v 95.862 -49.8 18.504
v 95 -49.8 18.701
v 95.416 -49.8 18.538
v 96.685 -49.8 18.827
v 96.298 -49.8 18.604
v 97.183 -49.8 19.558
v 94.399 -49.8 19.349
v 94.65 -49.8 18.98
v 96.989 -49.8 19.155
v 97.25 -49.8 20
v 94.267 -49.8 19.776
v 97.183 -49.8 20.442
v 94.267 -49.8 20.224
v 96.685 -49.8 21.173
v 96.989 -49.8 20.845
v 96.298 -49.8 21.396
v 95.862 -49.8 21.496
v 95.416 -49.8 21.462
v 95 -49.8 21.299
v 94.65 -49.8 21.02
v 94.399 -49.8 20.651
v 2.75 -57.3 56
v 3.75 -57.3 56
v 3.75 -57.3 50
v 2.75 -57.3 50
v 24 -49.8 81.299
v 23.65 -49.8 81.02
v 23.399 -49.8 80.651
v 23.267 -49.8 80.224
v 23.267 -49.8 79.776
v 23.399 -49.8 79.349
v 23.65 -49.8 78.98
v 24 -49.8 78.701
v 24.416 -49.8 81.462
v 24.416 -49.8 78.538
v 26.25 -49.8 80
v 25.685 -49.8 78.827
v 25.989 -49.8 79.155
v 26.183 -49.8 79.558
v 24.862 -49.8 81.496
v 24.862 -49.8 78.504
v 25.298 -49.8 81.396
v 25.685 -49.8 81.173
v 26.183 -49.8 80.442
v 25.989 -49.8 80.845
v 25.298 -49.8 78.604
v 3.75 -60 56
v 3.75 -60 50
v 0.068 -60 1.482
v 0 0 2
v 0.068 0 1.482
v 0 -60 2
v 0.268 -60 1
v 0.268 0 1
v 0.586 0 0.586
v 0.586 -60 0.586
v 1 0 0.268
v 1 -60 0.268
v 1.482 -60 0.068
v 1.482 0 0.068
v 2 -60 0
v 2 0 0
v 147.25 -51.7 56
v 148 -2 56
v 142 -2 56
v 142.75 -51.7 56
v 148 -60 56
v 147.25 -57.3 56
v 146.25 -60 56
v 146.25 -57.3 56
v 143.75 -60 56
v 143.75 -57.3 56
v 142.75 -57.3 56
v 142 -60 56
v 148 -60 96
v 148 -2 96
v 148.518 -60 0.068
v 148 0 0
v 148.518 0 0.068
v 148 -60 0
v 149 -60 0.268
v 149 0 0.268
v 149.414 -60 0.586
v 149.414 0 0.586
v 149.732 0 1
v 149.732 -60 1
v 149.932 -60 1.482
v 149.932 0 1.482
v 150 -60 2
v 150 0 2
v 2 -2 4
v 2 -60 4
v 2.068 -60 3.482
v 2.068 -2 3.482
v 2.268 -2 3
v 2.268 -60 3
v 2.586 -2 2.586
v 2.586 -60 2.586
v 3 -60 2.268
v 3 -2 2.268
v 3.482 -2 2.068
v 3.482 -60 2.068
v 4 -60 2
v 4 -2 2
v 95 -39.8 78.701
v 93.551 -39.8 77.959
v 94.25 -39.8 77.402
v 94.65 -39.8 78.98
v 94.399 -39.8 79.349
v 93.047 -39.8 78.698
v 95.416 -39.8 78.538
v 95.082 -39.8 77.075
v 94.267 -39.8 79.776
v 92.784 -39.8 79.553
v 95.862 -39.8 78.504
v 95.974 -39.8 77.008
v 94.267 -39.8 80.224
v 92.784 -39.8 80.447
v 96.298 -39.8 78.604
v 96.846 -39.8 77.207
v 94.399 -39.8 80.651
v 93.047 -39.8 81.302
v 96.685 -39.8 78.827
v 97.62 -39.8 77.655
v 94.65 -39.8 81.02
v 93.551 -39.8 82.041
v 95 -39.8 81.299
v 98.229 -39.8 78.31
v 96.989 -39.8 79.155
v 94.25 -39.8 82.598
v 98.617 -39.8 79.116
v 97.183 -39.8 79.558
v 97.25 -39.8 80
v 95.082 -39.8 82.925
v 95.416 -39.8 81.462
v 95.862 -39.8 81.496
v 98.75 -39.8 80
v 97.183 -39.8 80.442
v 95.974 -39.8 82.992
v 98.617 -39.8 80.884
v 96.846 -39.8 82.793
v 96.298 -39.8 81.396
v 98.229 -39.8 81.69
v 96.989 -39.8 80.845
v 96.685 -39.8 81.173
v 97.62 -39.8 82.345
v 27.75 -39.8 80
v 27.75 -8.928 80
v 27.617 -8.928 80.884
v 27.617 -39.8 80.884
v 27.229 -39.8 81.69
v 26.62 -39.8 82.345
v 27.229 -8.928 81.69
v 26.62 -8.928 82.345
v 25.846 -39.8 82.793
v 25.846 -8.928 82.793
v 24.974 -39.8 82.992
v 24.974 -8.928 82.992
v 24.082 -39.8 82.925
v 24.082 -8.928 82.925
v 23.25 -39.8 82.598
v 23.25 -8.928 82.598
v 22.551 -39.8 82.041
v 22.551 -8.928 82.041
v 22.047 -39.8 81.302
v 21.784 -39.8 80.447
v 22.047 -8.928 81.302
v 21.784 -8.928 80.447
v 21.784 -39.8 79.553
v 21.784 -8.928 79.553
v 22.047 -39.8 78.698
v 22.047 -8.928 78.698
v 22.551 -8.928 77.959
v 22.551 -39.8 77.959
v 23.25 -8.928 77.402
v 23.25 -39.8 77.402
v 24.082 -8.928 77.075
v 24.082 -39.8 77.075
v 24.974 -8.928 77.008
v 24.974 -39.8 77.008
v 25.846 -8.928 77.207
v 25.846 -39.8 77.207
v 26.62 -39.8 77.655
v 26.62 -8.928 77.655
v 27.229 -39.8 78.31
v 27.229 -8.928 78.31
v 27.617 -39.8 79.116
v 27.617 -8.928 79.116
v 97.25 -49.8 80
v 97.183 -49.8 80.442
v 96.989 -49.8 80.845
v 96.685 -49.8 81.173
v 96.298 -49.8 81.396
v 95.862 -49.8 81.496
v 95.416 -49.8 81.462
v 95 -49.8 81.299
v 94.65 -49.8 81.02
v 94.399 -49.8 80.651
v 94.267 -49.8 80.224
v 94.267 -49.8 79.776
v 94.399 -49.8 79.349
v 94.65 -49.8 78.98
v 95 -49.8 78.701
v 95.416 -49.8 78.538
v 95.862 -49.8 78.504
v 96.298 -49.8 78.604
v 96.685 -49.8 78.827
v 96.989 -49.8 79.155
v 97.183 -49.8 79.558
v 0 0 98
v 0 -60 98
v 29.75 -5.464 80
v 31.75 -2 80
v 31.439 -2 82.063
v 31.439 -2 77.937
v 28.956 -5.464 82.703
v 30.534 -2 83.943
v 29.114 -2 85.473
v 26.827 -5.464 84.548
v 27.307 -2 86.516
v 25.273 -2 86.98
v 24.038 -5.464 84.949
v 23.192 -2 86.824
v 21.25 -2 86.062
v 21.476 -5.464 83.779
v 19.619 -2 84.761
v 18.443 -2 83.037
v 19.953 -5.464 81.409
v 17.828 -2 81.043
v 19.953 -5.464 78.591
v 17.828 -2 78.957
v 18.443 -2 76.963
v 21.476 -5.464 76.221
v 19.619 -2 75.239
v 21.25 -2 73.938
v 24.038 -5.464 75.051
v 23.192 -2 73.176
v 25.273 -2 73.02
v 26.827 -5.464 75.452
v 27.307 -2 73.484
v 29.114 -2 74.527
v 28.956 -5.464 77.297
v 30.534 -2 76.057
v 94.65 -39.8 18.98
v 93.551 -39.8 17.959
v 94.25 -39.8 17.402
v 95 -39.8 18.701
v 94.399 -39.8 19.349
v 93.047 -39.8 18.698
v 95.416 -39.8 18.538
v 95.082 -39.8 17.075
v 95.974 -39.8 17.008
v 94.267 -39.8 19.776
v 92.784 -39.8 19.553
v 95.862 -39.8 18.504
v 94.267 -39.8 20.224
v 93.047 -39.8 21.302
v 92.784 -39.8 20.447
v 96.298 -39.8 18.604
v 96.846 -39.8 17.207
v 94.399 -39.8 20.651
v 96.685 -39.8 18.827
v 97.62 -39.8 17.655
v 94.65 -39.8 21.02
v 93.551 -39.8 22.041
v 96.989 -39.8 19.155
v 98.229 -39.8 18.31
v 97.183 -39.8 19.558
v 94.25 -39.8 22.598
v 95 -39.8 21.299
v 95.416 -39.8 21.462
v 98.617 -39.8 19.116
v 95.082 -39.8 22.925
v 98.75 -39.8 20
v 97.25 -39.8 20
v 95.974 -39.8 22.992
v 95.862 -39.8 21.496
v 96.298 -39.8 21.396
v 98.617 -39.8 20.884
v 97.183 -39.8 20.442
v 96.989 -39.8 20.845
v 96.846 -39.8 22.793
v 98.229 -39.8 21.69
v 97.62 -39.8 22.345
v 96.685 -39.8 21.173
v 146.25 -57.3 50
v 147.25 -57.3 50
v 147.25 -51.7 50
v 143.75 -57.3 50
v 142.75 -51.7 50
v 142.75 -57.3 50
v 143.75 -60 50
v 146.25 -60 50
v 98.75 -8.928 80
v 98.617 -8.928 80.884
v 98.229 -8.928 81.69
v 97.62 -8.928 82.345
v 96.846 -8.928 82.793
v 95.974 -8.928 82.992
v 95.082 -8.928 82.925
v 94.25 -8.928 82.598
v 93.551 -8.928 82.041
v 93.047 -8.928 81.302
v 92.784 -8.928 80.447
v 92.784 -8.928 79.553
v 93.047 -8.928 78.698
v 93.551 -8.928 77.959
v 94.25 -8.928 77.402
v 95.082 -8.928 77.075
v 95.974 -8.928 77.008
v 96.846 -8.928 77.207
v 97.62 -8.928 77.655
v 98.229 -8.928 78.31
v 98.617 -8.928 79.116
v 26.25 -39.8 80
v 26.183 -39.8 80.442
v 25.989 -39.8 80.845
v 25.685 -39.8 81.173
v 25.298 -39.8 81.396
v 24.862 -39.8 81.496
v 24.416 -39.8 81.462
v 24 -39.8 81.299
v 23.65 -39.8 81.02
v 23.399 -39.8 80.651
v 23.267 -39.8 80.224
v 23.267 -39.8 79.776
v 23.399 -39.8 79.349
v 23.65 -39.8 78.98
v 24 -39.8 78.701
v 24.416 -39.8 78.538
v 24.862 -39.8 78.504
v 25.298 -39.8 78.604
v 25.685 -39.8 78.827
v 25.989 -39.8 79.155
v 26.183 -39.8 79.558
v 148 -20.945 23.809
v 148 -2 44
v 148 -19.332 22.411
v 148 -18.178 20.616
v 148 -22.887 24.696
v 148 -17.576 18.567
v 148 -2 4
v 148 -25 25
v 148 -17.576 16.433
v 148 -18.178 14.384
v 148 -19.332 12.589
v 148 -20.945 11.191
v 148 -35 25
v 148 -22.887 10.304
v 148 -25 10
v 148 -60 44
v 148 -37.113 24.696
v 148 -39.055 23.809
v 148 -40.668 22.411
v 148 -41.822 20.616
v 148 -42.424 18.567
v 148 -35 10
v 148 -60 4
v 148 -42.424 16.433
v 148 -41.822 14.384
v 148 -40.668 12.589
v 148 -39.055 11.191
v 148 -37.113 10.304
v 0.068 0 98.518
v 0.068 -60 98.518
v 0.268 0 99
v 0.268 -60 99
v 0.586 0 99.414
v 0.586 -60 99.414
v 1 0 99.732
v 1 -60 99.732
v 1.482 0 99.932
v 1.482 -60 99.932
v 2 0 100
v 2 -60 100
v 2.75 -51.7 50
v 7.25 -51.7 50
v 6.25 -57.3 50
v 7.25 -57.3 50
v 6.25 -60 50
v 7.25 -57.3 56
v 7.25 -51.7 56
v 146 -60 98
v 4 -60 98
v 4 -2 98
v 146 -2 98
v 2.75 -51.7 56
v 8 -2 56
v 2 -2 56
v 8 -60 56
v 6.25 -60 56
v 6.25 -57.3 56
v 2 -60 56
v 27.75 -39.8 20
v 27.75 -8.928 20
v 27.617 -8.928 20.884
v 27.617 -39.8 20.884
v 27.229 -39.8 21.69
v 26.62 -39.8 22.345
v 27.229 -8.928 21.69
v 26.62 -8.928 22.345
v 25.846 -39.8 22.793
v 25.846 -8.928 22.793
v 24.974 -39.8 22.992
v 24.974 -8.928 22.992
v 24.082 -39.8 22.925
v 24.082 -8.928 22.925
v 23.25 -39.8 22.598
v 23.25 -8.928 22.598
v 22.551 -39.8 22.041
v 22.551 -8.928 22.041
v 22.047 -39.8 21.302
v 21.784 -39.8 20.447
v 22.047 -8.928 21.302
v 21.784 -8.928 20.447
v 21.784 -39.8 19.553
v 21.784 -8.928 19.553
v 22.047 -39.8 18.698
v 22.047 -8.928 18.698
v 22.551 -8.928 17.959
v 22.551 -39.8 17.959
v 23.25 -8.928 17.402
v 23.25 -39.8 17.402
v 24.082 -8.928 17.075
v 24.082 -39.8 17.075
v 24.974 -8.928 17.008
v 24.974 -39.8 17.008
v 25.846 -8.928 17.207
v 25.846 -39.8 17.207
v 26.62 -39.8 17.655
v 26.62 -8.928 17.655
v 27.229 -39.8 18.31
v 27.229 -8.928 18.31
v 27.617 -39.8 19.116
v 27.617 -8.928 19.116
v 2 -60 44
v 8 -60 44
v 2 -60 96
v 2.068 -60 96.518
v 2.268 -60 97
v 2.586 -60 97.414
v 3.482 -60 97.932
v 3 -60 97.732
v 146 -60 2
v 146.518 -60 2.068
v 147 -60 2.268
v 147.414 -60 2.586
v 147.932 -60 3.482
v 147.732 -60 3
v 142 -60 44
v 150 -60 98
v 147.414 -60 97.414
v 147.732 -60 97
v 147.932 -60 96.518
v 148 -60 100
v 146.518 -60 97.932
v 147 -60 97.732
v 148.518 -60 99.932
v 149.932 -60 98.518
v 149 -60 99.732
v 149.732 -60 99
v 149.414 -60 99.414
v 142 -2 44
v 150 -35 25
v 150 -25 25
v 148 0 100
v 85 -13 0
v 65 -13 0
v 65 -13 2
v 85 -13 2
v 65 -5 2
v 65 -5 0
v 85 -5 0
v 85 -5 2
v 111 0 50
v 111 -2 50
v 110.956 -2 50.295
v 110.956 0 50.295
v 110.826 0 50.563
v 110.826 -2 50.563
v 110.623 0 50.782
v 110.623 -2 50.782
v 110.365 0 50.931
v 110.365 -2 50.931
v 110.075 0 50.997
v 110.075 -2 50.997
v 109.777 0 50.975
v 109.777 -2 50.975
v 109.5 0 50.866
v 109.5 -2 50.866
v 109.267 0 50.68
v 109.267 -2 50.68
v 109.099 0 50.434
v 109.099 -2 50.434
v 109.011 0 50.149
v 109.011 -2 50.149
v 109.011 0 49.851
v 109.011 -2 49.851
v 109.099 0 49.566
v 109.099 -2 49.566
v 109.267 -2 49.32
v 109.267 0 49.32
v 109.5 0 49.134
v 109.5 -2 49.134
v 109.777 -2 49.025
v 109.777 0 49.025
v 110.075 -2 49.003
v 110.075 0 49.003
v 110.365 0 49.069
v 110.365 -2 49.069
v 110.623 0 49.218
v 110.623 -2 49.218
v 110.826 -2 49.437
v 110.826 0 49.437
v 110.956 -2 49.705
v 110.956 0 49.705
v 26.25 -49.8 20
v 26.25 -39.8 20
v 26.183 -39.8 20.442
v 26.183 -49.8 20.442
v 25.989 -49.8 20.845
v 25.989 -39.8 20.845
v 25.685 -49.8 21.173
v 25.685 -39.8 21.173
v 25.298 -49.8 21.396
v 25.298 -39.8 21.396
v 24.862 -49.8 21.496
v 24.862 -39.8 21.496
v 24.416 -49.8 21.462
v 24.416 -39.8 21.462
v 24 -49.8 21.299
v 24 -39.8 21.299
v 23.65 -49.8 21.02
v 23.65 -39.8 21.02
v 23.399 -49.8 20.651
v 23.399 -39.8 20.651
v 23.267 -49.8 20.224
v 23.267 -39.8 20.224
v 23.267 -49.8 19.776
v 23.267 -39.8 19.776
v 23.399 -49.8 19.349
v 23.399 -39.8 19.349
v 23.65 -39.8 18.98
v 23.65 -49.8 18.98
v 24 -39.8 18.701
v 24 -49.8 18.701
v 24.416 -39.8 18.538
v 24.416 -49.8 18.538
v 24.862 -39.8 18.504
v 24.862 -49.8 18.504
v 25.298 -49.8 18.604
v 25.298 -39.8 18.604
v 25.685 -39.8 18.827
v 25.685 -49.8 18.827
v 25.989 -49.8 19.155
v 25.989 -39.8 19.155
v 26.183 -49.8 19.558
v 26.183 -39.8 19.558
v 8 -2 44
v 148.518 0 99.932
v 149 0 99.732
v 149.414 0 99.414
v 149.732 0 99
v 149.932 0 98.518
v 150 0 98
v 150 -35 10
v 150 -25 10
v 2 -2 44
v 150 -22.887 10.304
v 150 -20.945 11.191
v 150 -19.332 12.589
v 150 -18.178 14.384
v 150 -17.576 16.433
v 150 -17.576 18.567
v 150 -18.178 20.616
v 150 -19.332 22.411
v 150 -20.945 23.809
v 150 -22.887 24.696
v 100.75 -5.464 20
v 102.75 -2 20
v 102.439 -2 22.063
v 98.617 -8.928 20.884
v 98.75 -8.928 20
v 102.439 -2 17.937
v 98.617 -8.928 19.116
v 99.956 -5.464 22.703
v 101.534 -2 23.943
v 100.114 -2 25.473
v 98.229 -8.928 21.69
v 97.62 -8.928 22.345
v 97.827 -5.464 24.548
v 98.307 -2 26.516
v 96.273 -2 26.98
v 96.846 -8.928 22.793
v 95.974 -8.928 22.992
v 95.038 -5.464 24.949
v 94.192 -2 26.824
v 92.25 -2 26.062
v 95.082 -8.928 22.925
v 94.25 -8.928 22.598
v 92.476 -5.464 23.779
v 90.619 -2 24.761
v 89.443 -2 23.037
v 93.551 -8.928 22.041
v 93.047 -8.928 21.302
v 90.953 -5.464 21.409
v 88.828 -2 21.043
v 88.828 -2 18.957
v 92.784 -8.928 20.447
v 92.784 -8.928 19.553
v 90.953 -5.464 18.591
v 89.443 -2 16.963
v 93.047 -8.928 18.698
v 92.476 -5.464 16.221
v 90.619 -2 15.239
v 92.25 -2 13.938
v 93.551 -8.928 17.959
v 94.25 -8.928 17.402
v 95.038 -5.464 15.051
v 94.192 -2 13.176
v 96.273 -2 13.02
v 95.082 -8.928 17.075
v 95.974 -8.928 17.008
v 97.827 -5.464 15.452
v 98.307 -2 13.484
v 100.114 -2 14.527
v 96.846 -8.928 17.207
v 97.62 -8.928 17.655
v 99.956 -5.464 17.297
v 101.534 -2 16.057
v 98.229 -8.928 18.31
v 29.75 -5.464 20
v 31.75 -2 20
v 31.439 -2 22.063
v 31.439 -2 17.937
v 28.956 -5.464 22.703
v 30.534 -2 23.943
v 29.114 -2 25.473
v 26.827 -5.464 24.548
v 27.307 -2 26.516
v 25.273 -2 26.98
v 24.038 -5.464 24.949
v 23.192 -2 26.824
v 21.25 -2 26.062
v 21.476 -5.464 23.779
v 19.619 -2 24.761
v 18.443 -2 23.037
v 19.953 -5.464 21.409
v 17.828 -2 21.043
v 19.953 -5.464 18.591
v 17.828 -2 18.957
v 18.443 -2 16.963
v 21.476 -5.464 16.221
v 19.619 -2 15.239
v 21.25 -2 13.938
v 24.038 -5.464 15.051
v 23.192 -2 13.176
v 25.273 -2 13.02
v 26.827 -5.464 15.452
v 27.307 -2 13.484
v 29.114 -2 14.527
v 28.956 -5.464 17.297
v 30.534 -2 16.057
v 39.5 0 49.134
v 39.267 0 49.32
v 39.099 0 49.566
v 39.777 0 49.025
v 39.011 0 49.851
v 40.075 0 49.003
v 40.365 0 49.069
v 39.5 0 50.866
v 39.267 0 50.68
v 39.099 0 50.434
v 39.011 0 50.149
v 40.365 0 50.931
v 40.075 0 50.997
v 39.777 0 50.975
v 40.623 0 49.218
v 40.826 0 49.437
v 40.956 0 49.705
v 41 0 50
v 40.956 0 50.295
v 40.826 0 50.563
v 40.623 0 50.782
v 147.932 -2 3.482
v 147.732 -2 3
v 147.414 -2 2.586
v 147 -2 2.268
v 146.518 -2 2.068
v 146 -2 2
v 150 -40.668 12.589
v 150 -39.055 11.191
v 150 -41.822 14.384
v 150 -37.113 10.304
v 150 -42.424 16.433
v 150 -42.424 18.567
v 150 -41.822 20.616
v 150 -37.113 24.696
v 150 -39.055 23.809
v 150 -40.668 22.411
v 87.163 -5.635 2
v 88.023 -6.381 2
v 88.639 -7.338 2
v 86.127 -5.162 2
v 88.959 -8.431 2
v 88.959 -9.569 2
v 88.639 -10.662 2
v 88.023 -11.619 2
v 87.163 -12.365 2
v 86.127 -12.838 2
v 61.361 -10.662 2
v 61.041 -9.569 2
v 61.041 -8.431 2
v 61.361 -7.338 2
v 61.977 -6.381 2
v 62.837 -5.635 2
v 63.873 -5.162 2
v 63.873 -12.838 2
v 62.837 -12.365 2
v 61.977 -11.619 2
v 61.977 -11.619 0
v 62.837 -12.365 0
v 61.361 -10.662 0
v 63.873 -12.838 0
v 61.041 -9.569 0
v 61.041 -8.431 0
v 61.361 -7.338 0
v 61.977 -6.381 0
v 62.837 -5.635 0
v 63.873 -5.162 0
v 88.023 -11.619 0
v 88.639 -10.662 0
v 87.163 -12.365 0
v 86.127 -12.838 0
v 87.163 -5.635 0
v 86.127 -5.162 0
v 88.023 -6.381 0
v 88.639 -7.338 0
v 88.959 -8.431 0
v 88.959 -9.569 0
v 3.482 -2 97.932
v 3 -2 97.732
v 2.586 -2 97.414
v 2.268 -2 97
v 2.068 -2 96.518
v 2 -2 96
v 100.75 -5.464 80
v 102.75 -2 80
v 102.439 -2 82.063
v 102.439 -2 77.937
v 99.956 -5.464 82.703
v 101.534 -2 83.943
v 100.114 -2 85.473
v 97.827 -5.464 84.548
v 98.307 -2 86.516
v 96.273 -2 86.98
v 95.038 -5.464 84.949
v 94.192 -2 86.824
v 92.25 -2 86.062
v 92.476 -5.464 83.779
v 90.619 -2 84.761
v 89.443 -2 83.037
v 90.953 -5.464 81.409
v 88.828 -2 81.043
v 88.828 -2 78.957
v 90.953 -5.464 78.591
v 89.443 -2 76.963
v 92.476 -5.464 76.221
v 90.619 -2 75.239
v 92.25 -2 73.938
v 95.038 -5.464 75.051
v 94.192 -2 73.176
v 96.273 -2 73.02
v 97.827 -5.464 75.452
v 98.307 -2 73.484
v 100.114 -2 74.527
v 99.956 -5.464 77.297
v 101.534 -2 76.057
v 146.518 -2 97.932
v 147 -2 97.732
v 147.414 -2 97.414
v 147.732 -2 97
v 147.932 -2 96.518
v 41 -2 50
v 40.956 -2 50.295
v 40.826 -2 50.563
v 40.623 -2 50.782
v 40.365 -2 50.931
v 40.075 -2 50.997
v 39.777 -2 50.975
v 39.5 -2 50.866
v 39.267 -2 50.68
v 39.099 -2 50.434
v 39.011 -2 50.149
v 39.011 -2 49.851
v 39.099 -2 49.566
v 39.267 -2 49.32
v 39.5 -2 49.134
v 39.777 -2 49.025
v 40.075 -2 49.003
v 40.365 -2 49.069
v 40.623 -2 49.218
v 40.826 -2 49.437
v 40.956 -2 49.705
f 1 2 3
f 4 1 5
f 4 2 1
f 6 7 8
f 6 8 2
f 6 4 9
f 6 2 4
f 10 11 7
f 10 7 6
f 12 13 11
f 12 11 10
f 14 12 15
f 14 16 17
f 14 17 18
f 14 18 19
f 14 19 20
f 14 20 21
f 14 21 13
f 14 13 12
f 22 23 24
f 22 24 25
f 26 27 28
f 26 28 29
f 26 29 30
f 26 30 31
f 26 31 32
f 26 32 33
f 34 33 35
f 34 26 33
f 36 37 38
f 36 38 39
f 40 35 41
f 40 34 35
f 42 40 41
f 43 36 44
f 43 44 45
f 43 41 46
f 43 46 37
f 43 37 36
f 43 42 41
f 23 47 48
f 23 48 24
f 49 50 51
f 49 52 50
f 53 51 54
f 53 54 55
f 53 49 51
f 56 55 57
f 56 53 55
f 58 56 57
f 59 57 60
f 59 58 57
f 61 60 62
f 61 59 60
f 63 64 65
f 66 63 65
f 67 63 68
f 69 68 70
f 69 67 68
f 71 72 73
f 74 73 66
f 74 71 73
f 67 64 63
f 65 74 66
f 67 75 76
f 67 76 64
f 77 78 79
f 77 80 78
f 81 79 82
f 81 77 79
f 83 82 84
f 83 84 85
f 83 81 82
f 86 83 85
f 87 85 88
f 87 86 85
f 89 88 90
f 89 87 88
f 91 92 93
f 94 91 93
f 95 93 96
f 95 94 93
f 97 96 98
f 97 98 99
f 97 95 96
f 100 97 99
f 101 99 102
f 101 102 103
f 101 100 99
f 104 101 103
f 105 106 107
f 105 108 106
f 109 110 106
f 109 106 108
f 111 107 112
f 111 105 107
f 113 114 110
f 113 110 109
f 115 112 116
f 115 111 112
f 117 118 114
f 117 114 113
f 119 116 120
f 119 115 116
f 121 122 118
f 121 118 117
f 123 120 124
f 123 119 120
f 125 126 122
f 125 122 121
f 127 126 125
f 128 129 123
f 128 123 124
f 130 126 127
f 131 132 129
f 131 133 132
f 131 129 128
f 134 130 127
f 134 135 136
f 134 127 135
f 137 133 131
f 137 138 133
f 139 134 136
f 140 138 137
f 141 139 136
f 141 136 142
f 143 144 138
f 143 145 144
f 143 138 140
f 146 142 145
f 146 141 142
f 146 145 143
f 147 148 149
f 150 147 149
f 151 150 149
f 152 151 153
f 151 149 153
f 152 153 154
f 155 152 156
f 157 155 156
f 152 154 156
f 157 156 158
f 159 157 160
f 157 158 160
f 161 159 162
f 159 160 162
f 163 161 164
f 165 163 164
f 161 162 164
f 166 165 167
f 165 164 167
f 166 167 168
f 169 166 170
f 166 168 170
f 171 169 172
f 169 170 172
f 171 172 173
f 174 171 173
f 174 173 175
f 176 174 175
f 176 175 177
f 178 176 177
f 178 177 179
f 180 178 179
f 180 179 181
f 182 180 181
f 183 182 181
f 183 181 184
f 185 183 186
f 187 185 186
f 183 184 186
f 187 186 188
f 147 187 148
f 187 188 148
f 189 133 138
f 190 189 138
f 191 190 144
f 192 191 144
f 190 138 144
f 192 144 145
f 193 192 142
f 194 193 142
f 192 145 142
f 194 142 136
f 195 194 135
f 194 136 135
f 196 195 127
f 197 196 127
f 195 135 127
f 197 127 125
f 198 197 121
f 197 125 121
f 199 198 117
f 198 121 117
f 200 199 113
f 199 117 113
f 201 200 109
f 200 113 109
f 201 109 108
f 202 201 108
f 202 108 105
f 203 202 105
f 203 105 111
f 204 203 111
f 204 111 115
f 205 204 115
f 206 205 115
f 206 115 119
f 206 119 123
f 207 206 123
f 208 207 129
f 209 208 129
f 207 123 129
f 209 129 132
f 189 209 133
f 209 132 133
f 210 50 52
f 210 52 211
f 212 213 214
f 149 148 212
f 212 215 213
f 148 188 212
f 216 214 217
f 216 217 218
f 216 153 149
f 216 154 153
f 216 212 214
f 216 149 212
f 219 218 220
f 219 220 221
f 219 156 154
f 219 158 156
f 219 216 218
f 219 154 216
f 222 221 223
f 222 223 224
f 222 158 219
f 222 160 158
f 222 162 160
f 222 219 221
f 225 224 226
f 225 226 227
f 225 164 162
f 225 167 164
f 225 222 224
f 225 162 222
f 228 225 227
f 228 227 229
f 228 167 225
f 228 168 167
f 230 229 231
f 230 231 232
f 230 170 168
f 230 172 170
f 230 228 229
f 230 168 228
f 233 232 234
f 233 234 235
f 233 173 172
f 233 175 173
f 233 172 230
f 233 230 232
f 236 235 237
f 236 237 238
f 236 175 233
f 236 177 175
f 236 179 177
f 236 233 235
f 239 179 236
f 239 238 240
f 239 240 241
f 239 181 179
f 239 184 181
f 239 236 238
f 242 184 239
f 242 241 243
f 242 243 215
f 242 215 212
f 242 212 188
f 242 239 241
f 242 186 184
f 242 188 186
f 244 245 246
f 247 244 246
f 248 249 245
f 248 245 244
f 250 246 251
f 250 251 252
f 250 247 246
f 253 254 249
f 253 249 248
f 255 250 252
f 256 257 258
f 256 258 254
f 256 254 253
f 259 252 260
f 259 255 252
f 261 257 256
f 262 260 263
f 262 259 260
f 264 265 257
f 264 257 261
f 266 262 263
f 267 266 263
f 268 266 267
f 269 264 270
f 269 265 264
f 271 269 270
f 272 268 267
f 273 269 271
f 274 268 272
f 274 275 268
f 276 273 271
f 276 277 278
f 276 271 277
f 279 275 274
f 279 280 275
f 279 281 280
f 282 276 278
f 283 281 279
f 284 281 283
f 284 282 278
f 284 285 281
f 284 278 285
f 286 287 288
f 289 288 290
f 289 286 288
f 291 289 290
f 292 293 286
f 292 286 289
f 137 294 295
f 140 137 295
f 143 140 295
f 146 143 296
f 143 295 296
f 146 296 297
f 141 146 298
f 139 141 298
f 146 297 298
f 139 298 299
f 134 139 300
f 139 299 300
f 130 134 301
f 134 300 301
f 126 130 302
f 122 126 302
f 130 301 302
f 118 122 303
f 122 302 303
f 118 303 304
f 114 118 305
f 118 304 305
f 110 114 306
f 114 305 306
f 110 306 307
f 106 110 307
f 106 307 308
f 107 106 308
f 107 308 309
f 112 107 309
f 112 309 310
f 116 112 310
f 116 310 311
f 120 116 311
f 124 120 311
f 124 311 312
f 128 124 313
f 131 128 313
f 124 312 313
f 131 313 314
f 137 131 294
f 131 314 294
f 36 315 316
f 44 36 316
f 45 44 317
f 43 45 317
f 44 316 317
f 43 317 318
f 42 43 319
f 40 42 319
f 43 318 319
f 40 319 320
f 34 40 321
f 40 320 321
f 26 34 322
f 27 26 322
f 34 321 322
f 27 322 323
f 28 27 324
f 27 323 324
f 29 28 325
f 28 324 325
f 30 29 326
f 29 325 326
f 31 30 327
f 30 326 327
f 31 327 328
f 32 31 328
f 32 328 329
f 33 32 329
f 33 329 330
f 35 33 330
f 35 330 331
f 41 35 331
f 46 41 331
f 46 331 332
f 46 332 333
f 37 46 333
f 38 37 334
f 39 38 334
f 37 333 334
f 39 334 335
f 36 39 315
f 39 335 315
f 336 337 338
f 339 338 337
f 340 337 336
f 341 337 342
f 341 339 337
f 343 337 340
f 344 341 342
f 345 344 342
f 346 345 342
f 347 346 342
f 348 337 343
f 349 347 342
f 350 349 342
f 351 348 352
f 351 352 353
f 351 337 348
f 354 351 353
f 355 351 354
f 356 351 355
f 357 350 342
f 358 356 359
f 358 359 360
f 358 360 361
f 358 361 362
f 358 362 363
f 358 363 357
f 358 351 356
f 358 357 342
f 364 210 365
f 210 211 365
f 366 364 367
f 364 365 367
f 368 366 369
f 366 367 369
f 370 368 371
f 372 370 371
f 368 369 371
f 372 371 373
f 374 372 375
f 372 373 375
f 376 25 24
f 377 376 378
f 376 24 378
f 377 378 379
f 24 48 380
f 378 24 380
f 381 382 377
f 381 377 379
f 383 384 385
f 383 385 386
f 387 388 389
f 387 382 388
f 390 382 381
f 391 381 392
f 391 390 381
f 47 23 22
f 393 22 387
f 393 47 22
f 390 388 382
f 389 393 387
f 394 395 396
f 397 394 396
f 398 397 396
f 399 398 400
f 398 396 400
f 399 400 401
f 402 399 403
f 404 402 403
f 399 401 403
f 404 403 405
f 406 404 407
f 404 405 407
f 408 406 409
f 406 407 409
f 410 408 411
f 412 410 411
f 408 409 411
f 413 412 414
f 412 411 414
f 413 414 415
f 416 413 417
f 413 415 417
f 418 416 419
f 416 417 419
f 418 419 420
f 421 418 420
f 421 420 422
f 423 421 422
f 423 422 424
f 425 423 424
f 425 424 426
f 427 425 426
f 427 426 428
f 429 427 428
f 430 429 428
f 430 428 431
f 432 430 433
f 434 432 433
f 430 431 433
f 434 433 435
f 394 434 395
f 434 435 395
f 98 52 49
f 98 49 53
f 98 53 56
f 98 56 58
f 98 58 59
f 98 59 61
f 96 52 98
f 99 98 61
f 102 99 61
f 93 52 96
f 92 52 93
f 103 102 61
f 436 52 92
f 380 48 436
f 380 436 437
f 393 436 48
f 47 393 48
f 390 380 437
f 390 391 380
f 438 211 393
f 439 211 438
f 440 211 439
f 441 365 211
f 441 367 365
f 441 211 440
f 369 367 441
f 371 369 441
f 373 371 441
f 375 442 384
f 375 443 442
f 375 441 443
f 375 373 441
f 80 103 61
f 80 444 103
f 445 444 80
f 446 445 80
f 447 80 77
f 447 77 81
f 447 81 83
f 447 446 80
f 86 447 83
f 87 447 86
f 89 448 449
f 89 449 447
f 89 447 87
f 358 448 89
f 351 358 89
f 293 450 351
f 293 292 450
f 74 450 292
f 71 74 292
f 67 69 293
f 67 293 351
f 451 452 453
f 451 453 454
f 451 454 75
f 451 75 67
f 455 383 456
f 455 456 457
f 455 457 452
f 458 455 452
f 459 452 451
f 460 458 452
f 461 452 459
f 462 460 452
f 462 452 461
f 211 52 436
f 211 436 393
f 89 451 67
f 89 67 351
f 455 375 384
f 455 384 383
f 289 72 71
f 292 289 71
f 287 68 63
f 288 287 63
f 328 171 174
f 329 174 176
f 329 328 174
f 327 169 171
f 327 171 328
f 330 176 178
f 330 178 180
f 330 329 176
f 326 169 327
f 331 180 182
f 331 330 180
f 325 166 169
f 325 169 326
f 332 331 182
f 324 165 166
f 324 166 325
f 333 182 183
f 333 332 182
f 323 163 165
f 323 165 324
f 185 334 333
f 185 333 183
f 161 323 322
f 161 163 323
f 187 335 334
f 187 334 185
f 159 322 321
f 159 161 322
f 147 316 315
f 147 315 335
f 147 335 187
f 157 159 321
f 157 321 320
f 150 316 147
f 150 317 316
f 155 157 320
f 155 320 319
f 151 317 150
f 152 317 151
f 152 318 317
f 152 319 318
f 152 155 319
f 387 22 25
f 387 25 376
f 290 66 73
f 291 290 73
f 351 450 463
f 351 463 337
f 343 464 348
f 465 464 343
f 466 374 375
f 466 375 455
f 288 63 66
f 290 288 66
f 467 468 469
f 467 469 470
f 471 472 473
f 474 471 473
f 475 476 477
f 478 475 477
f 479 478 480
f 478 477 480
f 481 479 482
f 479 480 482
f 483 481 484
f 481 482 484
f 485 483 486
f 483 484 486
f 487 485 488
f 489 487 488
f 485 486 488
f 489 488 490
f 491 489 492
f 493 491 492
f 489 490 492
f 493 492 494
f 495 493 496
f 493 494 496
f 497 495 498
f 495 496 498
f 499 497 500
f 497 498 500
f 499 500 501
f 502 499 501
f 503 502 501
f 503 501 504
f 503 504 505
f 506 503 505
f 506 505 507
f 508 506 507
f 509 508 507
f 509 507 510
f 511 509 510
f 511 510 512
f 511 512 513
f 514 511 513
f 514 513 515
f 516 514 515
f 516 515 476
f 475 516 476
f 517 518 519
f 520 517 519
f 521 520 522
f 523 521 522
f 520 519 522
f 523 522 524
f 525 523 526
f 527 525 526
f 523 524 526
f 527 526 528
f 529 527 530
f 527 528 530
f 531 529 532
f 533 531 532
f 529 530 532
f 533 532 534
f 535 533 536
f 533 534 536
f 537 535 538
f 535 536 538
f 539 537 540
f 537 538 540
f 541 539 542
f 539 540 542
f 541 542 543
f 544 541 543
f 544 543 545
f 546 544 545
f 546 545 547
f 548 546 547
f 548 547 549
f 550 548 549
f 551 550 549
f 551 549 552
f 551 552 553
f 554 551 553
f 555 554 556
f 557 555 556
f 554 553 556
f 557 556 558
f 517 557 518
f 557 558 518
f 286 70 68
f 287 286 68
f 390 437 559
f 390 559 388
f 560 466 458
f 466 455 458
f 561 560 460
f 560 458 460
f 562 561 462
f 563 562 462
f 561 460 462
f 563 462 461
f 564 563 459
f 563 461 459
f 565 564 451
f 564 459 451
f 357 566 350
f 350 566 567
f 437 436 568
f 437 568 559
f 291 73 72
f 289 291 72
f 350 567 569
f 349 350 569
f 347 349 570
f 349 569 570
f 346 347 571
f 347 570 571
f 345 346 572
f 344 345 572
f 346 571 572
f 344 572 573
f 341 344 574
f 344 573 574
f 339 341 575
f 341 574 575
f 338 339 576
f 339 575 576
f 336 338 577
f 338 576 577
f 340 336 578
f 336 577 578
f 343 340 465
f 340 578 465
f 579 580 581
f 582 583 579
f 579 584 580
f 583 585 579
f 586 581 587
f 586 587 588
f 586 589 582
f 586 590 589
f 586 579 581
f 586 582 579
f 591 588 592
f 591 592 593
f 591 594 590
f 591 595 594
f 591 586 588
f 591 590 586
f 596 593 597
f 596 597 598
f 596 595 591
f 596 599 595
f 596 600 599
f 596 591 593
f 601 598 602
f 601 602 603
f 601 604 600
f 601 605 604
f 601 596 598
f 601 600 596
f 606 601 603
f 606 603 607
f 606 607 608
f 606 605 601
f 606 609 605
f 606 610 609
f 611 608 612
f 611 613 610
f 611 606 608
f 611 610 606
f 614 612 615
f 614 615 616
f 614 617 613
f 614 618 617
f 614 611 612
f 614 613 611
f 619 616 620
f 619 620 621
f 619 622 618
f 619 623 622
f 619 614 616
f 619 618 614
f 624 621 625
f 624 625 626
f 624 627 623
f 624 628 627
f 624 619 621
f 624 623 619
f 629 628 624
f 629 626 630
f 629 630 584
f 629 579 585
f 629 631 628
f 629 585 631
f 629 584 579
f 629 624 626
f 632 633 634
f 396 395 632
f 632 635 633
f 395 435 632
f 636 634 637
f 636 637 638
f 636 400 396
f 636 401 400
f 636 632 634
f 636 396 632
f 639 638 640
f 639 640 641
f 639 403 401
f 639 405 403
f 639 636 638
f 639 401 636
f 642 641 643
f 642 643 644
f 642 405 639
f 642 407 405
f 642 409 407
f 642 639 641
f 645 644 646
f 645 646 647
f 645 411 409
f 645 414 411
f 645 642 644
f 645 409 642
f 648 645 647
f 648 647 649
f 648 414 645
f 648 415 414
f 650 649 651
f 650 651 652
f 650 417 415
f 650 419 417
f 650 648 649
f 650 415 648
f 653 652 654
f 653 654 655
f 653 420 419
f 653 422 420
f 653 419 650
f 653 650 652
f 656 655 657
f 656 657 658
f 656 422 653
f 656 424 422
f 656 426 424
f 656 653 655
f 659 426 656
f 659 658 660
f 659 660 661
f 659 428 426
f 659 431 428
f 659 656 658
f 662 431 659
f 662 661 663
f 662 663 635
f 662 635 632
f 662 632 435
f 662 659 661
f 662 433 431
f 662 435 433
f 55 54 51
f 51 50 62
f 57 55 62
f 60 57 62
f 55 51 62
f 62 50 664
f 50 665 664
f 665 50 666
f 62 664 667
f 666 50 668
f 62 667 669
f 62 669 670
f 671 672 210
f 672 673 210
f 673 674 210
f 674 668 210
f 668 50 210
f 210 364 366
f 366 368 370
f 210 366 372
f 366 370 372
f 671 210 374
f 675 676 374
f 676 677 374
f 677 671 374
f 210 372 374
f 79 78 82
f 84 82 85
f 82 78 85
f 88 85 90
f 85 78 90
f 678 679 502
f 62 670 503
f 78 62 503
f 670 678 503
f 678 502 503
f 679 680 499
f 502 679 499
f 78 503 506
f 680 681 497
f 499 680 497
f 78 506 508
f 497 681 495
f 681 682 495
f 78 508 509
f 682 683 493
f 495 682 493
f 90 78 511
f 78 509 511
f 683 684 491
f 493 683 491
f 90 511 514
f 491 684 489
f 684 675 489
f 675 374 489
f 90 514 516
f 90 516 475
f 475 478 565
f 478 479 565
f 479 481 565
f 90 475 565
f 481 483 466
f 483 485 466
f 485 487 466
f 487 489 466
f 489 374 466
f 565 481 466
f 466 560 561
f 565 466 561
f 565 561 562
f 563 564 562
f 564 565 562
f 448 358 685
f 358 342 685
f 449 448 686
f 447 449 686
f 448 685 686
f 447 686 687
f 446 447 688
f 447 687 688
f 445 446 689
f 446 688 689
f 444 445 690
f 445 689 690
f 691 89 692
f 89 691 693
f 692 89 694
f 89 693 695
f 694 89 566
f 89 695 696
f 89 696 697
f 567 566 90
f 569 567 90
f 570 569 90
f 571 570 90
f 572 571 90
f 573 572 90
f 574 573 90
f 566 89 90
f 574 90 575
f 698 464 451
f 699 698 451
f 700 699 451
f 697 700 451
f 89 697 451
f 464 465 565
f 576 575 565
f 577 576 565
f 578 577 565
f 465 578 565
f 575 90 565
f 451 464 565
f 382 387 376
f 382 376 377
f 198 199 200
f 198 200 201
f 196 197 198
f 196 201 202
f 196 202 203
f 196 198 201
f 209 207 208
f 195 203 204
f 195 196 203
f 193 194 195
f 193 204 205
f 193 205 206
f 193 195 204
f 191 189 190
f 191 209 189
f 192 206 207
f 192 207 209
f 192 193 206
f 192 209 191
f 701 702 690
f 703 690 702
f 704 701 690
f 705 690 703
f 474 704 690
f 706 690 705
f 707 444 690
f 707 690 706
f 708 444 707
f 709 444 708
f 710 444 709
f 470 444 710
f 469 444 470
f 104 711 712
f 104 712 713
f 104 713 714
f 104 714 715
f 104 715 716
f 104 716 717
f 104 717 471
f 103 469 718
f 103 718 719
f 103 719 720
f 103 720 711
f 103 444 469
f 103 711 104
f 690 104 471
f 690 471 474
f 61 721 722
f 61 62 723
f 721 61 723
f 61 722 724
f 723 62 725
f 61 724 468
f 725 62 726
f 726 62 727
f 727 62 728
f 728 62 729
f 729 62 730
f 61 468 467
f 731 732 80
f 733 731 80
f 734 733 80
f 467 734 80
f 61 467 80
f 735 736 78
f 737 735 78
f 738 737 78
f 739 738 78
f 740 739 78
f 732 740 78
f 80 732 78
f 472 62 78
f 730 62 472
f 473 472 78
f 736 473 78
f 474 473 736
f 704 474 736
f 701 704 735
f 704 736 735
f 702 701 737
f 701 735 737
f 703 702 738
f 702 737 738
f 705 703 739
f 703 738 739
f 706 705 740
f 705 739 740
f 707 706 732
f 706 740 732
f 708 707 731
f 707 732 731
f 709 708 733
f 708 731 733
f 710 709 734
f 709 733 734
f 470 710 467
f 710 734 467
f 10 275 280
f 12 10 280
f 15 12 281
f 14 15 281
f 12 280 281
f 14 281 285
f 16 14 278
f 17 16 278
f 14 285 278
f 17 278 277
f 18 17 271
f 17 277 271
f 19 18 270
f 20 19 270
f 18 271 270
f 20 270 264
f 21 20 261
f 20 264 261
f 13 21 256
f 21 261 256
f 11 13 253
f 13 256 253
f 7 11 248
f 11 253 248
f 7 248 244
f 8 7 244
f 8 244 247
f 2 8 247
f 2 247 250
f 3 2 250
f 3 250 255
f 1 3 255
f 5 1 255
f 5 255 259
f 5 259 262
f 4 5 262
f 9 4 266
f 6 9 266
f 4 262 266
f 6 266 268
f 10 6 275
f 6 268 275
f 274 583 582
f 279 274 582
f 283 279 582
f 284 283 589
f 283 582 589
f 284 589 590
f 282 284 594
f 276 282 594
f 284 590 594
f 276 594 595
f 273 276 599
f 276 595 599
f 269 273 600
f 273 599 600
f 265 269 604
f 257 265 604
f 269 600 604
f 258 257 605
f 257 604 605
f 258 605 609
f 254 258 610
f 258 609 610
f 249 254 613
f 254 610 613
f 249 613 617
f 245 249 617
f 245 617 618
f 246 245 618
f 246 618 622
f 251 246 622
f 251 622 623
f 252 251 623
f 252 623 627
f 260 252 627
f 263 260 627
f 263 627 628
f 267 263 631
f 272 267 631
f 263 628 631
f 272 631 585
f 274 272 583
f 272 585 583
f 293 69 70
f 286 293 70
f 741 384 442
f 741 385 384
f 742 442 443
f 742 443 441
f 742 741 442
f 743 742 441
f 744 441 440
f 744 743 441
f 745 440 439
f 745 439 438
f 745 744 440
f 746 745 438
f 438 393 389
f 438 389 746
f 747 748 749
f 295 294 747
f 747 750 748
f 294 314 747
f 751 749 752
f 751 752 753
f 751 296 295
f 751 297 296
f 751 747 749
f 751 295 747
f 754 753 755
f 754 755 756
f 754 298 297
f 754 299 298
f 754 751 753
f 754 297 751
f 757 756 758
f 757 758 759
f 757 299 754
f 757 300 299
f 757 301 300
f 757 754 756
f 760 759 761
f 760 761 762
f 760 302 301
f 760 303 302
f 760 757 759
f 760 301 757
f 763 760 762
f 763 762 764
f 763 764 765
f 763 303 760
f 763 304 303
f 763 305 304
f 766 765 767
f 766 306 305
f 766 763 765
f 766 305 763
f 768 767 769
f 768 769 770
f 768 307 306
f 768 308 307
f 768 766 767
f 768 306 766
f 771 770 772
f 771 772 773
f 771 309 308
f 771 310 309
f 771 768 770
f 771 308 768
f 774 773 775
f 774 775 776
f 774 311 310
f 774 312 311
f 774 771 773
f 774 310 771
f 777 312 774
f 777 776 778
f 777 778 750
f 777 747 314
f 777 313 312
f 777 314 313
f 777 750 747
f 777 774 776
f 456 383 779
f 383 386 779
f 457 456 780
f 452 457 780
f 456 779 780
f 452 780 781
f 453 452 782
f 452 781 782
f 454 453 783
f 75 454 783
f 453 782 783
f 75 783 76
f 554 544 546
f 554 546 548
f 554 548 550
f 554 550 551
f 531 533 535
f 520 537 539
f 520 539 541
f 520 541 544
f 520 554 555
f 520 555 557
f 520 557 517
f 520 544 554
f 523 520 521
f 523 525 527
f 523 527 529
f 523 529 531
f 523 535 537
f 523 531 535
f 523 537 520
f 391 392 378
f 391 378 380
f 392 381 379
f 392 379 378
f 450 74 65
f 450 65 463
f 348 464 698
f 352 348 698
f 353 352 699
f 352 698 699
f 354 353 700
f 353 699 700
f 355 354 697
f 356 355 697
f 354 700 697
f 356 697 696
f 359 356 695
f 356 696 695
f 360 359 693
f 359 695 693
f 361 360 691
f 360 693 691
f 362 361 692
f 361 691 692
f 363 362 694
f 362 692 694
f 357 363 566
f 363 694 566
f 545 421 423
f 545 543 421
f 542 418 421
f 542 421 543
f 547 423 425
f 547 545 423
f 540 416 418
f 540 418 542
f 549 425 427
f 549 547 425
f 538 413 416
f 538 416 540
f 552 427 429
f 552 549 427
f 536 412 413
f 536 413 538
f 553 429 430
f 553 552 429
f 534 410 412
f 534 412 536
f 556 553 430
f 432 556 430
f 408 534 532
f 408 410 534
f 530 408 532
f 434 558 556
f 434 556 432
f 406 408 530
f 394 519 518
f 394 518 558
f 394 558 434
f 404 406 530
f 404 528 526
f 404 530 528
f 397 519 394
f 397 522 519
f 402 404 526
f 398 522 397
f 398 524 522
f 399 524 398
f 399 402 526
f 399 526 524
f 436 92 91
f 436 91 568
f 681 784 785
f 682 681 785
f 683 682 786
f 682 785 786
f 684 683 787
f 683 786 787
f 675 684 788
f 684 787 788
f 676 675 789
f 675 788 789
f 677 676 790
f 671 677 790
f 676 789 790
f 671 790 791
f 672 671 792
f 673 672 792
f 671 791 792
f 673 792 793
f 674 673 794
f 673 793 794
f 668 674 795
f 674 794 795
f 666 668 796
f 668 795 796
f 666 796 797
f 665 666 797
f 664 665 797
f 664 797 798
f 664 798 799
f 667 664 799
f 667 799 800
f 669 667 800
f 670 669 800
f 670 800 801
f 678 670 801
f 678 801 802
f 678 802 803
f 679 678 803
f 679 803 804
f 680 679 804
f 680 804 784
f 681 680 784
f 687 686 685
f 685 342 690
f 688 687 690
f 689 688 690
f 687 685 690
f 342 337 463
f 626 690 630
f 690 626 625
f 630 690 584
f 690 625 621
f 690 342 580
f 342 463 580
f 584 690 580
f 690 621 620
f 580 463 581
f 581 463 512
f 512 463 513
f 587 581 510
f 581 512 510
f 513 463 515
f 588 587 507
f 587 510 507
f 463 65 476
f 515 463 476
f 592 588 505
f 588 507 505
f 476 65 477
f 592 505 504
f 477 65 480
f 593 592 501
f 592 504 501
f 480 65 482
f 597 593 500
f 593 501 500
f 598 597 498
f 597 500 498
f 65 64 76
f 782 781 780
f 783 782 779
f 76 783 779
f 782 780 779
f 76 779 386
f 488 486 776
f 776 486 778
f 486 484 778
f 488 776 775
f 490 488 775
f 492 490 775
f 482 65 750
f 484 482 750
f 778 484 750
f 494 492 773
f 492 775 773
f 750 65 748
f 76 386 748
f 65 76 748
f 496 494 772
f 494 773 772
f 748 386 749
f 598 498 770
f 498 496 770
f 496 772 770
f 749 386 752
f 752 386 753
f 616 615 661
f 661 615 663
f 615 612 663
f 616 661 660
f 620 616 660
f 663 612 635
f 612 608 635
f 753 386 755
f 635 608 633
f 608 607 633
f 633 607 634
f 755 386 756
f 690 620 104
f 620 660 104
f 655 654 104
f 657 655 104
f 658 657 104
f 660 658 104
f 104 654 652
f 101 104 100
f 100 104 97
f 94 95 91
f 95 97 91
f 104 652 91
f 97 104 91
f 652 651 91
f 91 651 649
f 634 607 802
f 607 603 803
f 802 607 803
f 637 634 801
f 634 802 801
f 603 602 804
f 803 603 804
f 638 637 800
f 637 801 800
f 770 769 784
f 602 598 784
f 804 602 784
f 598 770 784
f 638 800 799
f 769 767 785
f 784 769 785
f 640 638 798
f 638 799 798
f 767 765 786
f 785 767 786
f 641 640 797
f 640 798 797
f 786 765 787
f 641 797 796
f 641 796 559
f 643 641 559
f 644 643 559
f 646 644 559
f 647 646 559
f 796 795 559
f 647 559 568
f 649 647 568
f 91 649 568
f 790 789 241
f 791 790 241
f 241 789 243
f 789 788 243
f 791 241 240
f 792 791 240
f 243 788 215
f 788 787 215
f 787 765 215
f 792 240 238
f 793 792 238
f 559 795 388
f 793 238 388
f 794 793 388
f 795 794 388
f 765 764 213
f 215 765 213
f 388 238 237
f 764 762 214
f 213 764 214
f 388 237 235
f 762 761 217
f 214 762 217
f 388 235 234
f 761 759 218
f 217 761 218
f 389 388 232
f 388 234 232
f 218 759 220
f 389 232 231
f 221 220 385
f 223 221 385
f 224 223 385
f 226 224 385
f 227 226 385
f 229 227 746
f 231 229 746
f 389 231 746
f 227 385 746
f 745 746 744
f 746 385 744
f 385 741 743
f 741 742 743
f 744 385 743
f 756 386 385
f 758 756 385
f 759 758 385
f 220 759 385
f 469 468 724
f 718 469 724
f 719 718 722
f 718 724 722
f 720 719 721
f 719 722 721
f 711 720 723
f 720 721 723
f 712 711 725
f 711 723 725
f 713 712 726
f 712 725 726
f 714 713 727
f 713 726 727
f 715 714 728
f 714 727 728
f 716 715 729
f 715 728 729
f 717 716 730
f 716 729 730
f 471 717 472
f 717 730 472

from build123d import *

# Parameters (mm, degrees)
SKETCH_W        = 150
SKETCH_H        = 100
PAD_DEPTH       = 60
POCKET_DEPTH    = 58
SKETCH002_R     = 3
PAD001_DEPTH    = 37.8
POCKET001_DEPTH = 2
POCKET002_DEPTH = 2
SKETCH007_R     = 1
POCKET003_DEPTH = 2.001
SKETCH009_R     = 1.5
PAD003_DEPTH    = 10
POCKET004_DEPTH = 6
POCKET005_DEPTH = 6
CHAMFER_ANGLE   = 60
CHAMFER_SIZE    = 4
FILLET_R        = 2
FILLET001_R     = 2


with BuildPart() as part:
    # Sketch → Pad (new body)
    with BuildSketch(Plane.XZ):
        with Locations((75, 50)):
            Rectangle(SKETCH_W, SKETCH_H)
    extrude(amount=PAD_DEPTH)

    # Sketch001 (on Face6 of Pad) → Pocket (cut)
    with BuildSketch(Plane.XZ.offset(60)):
        Polygon((2, 98), (148, 98), (148, 56), (142, 56), (142, 44), (148, 44), (148, 2), (2, 2), (2, 44), (8, 44), (8, 56), (2, 56), align=None)
    extrude(amount=-POCKET_DEPTH, mode=Mode.SUBTRACT)

    # Sketch002 (on Face19 of Pocket) → Pad001 (join)
    with BuildSketch(Plane.XZ.offset(2)):
        with Locations((24.75, 80)):
            Circle(SKETCH002_R)
        with Locations((95.75, 80)):
            Circle(SKETCH002_R)
        with Locations((24.75, 20)):
            Circle(SKETCH002_R)
        with Locations((95.75, 20)):
            Circle(SKETCH002_R)
    extrude(amount=PAD001_DEPTH)

    # Sketch005 → Pocket001 (cut)
    with BuildSketch(Plane(origin=(0, 0, 0), x_dir=(1, 0, 0), z_dir=(0, 0, -1))):
        with BuildLine():
            ThreePointArc((65, 13), (61, 9), (65, 5))
            Line((65, 5), (85, 5))
            ThreePointArc((85, 5), (89, 9), (85, 13))
            Line((65, 13), (85, 13))
        make_face()
    extrude(amount=-POCKET001_DEPTH, mode=Mode.SUBTRACT)

    # Sketch006 (on Face5 of Pocket001) → Pocket002 (cut)
    with BuildSketch(Plane(origin=(150, 0, 0), x_dir=(0, 0, 1), z_dir=(1, 0, 0))):
        with BuildLine():
            ThreePointArc((25, 35), (17.5, 42.5), (10, 35))
            Line((10, 35), (10, 25))
            ThreePointArc((10, 25), (17.5, 17.5), (25, 25))
            Line((25, 35), (25, 25))
        make_face()
    extrude(amount=-POCKET002_DEPTH, mode=Mode.SUBTRACT)

    # Sketch007 (on Face27 of Pocket002) → Pocket003 (cut, through all)
    with BuildSketch(Plane.XZ.offset(2)):
        with Locations((40, 50)):
            Circle(SKETCH007_R)
        with Locations((110, 50)):
            Circle(SKETCH007_R)
    extrude(amount=-POCKET003_DEPTH, mode=Mode.SUBTRACT)

    # Sketch009 (on Face35 of Pocket003) → Pad003 (join)
    with BuildSketch(Plane.XZ.offset(39.8)):
        with Locations((24.75, 80)):
            Circle(SKETCH009_R)
        with Locations((95.75, 80)):
            Circle(SKETCH009_R)
        with Locations((24.75, 20)):
            Circle(SKETCH009_R)
        with Locations((95.75, 20)):
            Circle(SKETCH009_R)
    extrude(amount=PAD003_DEPTH)

    # Sketch010 (on Face14 of Pad003) → Pocket004 (cut)
    with BuildSketch(Plane(origin=(0, 0, 56), x_dir=(-1, 0, 0), z_dir=(0, 0, 1))):
        Polygon((-3.75, 60), (-3.75, 57.3), (-2.75, 57.3), (-2.75, 51.7), (-7.25, 51.7), (-7.25, 57.3), (-6.25, 57.3), (-6.25, 60), align=None)
    extrude(amount=-POCKET004_DEPTH, mode=Mode.SUBTRACT)

    # Sketch011 (on Face24 of Pocket004) → Pocket005 (cut)
    with BuildSketch(Plane(origin=(0, 0, 56), x_dir=(-1, 0, 0), z_dir=(0, 0, 1))):
        Polygon((-143.75, 60), (-146.25, 60), (-146.25, 57.3), (-147.25, 57.3), (-147.25, 51.7), (-142.74998, 51.7), (-142.75, 57.3), (-143.75, 57.3), align=None)
    extrude(amount=-POCKET005_DEPTH, mode=Mode.SUBTRACT)

    # Chamfer
    chamfer_edges = [part.edges().sort_by_distance(p)[0] for p in [
        (21.75, -2, 80),
        (92.75, -2, 80),
        (92.75, -2, 20),
        (21.75, -2, 20),
    ]]
    chamfer_side = part.faces().sort_by_distance((75.121299, -2, 50))[0]
    chamfer(chamfer_edges, length=CHAMFER_SIZE, angle=CHAMFER_ANGLE, reference=chamfer_side)

    # Fillet
    fillet_edges = [part.edges().sort_by_distance(p)[0] for p in [
        (2, -31, 98),
        (2, -31, 2),
        (148, -31, 2),
        (148, -31, 98),
    ]]
    fillet(fillet_edges, radius=FILLET_R)

    # Fillet001
    fillet001_edges = [part.edges().sort_by_distance(p)[0] for p in [
        (0, -30, 0),
        (0, -30, 100),
        (150, -30, 100),
        (150, -30, 0),
    ]]
    fillet(fillet001_edges, radius=FILLET001_R)


solid = part.part
